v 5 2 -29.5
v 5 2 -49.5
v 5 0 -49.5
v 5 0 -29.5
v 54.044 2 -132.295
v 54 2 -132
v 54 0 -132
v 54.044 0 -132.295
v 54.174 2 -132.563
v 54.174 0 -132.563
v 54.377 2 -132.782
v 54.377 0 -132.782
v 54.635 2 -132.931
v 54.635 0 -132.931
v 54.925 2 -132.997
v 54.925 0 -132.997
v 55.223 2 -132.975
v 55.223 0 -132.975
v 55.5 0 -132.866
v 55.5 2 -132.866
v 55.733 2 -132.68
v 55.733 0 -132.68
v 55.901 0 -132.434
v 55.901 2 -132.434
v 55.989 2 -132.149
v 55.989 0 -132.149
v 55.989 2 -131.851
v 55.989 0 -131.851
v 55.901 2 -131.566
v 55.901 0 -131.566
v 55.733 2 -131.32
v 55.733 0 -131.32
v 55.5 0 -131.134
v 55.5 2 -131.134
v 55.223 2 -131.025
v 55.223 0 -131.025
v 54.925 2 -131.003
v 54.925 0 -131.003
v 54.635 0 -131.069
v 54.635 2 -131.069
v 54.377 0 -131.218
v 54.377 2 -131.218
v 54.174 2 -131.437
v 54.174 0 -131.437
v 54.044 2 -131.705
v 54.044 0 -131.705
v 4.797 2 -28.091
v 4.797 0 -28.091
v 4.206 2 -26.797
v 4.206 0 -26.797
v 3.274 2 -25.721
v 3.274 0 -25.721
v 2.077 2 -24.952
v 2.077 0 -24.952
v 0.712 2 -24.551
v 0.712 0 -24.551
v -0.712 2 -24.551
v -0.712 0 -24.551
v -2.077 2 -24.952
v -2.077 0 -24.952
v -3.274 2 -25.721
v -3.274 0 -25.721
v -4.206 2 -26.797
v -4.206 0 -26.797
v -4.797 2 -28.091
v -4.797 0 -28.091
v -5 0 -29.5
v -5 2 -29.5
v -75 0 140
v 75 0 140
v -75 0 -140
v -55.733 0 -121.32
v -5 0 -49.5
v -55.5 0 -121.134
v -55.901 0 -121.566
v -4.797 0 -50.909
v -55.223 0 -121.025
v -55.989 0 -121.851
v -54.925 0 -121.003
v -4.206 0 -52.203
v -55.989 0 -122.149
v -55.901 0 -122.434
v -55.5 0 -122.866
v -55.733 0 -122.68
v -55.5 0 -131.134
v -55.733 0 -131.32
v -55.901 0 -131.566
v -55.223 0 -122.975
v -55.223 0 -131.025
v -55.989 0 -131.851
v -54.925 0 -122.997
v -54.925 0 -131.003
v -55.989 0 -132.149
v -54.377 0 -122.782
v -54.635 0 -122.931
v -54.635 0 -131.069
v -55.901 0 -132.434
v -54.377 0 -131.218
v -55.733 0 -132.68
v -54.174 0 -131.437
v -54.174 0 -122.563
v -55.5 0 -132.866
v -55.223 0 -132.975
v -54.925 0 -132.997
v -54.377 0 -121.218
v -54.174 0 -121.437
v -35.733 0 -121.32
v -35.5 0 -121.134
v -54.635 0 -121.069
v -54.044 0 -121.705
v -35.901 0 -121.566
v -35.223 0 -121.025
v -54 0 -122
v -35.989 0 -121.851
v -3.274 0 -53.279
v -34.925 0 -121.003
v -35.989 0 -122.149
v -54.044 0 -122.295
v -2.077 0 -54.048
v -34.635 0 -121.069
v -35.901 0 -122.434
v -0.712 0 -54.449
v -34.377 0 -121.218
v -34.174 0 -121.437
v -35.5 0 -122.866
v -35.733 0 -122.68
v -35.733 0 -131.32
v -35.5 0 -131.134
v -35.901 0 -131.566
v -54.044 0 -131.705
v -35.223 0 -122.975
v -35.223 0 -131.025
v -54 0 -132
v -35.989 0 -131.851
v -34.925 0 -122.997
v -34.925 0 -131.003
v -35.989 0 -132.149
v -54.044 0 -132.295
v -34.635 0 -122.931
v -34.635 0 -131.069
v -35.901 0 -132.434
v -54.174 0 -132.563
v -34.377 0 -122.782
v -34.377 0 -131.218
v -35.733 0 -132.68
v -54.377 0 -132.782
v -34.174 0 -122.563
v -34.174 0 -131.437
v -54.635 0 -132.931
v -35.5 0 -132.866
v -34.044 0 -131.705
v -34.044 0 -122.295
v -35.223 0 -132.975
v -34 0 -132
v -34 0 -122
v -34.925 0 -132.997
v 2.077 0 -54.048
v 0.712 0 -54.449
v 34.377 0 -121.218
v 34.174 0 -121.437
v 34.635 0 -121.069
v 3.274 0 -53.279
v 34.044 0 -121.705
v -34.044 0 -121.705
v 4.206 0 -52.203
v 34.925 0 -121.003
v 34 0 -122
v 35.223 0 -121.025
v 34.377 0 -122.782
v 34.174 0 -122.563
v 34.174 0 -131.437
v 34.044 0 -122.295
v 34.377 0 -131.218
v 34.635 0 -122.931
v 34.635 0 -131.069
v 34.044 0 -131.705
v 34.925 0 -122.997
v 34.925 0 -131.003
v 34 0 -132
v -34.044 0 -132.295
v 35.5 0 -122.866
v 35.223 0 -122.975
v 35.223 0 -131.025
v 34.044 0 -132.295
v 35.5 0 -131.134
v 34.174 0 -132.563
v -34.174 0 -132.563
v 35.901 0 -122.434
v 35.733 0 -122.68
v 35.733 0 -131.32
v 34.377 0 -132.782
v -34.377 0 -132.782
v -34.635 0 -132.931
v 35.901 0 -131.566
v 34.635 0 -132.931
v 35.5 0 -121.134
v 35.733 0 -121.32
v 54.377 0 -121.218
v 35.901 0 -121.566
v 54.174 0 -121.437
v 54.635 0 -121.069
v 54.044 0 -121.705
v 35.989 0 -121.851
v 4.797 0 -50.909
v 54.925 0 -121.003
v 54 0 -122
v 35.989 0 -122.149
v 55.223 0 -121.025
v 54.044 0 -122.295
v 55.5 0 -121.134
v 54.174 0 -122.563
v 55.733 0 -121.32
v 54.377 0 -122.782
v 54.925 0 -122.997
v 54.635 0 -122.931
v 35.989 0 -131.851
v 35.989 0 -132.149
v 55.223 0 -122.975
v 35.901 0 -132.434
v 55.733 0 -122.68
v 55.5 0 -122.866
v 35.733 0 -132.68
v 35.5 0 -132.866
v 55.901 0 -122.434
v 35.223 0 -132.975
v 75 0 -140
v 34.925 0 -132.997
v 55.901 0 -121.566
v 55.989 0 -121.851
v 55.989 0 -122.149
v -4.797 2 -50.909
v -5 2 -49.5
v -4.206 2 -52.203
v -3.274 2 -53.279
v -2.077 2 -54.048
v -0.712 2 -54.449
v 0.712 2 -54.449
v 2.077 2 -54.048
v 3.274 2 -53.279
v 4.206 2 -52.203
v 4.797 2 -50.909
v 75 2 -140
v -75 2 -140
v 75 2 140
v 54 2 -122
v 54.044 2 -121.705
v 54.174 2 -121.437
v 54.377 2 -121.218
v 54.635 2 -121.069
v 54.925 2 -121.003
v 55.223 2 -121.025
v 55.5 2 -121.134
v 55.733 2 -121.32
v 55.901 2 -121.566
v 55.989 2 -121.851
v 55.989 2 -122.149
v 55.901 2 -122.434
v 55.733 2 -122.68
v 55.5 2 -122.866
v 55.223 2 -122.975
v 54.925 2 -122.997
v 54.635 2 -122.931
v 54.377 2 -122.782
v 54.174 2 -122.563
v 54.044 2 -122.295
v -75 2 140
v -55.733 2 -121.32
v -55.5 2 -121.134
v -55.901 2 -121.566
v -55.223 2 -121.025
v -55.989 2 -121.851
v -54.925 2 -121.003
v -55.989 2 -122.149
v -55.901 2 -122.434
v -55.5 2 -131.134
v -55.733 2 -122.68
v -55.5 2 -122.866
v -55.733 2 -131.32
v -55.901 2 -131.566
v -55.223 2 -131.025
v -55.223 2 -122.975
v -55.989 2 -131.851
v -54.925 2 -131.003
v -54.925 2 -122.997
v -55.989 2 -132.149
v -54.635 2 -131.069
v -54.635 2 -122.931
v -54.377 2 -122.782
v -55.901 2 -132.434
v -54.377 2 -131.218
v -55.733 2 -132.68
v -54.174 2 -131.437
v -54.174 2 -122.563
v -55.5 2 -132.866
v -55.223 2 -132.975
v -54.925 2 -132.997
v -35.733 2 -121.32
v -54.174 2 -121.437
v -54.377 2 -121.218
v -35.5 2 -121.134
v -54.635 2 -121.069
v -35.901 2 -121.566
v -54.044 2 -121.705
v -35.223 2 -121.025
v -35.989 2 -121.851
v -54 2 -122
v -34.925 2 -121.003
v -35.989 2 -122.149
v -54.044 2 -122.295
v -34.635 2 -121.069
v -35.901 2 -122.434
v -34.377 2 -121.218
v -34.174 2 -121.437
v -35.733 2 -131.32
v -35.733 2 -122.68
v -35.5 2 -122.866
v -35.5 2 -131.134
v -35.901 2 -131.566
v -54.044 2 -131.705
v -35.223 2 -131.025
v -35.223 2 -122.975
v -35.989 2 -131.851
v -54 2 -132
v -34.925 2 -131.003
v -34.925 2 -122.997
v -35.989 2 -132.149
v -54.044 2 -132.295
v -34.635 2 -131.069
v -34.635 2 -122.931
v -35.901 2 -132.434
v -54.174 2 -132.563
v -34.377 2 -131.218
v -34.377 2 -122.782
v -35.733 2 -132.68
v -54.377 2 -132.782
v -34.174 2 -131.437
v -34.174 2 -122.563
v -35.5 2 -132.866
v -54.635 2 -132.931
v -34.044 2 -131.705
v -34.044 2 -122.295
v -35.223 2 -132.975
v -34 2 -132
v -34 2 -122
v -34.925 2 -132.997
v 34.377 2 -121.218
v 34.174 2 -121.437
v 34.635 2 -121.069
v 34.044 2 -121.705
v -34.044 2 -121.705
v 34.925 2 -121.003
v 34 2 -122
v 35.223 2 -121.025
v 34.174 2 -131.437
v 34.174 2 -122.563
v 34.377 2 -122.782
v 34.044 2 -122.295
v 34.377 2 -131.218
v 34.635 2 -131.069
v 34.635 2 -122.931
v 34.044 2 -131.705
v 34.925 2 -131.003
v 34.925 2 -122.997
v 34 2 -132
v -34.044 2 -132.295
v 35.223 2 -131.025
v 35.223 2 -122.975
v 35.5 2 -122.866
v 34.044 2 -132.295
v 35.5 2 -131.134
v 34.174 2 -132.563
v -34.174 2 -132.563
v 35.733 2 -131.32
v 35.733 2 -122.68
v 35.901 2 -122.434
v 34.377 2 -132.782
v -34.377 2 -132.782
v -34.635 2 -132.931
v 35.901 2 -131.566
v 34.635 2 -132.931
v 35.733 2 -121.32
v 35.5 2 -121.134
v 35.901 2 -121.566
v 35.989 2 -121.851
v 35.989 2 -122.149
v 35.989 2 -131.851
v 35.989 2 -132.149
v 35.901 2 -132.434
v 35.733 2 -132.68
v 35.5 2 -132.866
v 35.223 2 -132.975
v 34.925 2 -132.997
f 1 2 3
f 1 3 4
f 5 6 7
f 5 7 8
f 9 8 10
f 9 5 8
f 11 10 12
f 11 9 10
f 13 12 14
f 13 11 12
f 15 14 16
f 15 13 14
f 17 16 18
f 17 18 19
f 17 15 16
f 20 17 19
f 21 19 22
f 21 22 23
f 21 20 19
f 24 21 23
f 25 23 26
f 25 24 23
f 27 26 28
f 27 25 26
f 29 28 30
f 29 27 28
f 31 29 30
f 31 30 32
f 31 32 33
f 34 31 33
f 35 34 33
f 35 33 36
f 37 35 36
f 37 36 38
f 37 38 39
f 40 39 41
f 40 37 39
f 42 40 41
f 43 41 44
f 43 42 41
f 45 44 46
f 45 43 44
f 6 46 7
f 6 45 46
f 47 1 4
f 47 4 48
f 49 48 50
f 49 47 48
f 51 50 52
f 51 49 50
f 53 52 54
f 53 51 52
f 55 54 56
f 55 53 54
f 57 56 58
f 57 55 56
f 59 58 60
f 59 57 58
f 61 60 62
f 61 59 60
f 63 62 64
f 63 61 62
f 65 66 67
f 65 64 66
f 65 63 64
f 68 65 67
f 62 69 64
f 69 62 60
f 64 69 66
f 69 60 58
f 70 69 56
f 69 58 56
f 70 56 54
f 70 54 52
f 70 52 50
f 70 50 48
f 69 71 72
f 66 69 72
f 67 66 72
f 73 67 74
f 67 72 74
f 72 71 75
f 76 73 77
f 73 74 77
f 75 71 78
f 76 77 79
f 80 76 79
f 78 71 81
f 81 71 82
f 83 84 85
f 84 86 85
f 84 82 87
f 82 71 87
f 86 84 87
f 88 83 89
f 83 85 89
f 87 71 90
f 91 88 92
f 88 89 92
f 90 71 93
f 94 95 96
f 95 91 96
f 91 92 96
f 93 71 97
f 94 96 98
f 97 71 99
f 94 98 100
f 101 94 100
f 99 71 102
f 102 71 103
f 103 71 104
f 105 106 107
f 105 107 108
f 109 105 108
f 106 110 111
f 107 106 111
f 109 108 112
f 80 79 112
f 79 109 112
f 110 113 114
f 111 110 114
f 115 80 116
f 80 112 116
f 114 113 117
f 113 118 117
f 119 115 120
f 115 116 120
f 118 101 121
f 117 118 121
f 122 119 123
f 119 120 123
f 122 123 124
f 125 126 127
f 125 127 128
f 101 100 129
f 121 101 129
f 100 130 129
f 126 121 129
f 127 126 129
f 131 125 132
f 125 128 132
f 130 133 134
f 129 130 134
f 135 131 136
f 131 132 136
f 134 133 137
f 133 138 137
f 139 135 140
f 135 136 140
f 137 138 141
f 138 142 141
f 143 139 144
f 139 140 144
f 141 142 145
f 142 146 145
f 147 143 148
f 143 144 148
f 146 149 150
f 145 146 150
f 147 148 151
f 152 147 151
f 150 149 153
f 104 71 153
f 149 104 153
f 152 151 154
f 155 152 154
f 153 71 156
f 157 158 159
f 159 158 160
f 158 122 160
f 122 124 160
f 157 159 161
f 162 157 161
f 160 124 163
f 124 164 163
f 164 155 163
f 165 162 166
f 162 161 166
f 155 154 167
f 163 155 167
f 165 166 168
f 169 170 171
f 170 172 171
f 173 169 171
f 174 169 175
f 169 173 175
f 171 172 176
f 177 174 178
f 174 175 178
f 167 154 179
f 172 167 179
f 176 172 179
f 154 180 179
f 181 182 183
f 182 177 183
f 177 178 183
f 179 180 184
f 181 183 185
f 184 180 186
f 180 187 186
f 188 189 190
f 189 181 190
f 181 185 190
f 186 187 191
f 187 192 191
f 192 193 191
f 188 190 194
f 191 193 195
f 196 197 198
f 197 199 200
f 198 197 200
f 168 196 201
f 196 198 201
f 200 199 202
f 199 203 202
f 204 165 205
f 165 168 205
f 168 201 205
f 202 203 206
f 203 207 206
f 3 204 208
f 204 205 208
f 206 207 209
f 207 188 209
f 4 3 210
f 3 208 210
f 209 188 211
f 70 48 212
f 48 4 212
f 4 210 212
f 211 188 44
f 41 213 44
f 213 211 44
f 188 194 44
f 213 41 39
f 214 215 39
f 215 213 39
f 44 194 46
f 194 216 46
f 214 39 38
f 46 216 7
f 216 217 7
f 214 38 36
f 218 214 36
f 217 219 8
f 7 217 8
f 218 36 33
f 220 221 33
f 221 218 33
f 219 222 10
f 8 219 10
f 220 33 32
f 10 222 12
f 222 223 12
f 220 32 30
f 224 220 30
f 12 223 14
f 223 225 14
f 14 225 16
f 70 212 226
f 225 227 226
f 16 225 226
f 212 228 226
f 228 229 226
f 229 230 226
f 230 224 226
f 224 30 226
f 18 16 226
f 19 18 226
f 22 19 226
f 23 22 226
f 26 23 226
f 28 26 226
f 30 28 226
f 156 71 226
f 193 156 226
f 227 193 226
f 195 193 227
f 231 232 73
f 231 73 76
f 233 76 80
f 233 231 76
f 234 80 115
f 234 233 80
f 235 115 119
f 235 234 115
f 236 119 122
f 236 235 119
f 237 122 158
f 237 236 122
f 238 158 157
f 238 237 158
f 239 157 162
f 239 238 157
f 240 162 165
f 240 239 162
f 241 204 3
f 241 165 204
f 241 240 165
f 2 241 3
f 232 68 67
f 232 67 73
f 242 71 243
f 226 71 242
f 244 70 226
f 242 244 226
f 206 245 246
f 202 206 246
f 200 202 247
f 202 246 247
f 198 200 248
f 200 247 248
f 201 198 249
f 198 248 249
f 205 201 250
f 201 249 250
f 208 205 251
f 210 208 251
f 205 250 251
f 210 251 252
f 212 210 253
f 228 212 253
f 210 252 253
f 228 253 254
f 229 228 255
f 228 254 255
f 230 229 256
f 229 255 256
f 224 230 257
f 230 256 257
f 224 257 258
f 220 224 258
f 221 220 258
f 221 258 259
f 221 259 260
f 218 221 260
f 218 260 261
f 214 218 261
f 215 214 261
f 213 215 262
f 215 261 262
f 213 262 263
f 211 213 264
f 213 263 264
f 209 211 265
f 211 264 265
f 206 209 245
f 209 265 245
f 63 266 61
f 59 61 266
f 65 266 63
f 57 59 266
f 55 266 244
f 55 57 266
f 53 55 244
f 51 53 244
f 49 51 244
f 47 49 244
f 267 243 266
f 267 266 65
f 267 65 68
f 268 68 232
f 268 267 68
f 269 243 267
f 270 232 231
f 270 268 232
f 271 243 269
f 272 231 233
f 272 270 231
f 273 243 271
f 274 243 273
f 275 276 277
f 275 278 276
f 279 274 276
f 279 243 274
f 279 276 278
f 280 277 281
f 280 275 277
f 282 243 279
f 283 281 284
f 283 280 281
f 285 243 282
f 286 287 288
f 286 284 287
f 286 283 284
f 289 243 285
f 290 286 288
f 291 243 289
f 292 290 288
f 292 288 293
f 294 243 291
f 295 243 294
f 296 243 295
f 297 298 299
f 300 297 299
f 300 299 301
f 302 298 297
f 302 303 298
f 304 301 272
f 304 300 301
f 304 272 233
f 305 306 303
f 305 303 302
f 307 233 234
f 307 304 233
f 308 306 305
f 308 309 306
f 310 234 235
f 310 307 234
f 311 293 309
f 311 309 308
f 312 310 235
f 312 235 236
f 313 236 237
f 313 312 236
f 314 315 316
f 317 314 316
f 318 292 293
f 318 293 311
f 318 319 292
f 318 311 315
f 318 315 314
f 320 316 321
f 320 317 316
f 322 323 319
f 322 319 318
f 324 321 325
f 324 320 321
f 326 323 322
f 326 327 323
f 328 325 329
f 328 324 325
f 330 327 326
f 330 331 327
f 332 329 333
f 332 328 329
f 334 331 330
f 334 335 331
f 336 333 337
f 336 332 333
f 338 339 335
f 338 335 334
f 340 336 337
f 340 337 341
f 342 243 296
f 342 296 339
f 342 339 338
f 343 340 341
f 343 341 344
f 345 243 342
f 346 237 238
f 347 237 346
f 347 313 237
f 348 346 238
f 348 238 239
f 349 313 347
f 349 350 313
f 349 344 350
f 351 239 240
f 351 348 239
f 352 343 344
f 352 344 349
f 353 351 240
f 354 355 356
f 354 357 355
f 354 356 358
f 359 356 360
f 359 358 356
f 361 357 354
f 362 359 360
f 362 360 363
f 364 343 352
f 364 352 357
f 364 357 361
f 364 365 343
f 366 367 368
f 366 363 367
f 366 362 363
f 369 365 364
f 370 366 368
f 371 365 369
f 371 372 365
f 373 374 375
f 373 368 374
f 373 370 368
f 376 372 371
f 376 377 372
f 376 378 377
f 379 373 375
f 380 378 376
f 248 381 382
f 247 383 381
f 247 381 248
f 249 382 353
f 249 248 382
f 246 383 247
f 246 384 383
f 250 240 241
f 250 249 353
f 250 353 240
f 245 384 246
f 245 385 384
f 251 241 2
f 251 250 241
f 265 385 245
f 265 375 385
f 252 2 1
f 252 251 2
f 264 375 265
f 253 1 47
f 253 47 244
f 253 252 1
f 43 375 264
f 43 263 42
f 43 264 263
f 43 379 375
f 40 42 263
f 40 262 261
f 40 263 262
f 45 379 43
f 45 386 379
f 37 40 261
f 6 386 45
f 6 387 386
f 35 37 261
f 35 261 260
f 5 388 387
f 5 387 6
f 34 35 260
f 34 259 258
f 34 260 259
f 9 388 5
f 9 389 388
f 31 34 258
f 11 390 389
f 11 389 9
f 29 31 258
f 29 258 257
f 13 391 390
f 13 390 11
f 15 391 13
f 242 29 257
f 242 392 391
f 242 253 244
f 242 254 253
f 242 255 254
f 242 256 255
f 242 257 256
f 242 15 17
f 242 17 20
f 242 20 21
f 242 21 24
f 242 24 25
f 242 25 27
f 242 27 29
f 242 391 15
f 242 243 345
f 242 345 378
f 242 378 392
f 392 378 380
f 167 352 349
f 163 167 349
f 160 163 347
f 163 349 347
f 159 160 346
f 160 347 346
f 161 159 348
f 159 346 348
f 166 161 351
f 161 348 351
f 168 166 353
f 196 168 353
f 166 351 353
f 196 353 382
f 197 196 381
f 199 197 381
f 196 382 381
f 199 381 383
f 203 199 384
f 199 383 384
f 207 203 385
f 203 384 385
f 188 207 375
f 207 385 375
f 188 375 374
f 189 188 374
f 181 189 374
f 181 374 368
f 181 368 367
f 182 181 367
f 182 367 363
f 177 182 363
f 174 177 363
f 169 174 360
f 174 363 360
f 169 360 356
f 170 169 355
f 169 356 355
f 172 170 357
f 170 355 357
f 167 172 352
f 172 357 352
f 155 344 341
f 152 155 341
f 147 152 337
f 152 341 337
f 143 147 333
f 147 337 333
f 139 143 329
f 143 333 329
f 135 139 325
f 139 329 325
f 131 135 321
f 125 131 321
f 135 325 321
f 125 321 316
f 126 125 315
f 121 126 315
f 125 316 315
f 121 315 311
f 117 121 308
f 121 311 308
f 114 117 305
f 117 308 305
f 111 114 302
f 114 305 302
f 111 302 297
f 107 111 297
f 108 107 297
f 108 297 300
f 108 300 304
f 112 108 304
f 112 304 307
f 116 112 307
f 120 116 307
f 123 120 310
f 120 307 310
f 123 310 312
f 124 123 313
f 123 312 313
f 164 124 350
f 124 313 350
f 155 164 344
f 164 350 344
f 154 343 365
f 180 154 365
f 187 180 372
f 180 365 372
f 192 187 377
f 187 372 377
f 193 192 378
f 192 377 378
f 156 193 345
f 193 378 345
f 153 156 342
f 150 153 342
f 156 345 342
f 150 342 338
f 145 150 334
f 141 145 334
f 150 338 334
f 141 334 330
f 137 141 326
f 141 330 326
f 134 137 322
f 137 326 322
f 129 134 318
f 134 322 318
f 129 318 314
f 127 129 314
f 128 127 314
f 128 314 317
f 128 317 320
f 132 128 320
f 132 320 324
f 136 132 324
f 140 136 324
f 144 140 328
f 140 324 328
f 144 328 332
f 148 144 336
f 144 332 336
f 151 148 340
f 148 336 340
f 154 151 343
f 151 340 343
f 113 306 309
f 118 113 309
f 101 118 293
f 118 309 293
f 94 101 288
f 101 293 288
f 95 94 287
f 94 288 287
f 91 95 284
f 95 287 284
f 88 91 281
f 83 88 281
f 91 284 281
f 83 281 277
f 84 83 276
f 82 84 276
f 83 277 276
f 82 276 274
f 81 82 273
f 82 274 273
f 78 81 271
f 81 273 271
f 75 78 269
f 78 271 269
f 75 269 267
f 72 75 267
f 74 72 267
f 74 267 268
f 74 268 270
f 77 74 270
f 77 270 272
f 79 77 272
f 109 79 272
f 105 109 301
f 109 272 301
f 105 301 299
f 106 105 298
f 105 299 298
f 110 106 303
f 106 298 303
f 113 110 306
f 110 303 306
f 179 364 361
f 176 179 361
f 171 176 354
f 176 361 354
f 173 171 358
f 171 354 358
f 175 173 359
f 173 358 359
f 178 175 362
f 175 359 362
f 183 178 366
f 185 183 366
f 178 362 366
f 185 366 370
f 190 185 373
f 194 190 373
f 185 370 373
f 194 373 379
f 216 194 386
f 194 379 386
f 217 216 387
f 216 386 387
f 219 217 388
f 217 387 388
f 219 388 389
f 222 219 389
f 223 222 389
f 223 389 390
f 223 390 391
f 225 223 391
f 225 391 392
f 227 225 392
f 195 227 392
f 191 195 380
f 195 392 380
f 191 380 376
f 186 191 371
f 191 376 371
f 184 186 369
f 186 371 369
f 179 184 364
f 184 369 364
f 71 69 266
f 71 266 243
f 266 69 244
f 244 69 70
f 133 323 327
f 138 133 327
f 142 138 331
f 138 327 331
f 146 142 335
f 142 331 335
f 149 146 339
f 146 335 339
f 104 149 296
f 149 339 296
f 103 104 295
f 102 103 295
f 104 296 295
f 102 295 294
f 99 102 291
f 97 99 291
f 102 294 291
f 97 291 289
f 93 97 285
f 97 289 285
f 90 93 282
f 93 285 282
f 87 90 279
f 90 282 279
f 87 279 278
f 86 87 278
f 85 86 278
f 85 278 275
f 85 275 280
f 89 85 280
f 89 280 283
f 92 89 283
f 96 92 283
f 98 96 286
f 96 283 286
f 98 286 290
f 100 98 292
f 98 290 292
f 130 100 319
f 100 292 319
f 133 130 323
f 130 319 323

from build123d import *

# Parameters (mm, degrees)
SKETCH_1_W                  = 150
SKETCH_1_H                  = 280
EXTRUDE_1_DEPTH             = 2
SKETCH_4_R                  = 1
CUT_EXTRUDE_1_DEPTH         = 2
PATTERN_LINEAR_1_COUNT      = 2
PATTERN_LINEAR_1_PITCH      = 20
PATTERN_LINEAR_1_COUNT_DIR2 = 2
PATTERN_LINEAR_1_PITCH_DIR2 = 10
MIRROR_2_COPY_1_SKETCH_R    = 1
MIRROR_2_COPY_1_DEPTH       = 2
MIRROR_2_COPY_2_SKETCH_R    = 1
MIRROR_2_COPY_2_DEPTH       = 2
MIRROR_2_COPY_3_SKETCH_R    = 1
MIRROR_2_COPY_3_DEPTH       = 2
CUT_EXTRUDE_2_DEPTH         = 10


with BuildPart() as part:
    # 草图1 → 凸台-拉伸1 (new body)
    with BuildSketch(Plane(origin=(0, 0, 0), x_dir=(1, 0, 0), z_dir=(0, 1, 0))):
        Rectangle(SKETCH_1_W, SKETCH_1_H)
    extrude(amount=EXTRUDE_1_DEPTH)

    # 草图4 → 切除-拉伸1 (cut)
    with BuildSketch(Plane(origin=(0, 2, 0), x_dir=(1, 0, 0), z_dir=(0, 1, 0))):
        with Locations((-55, 132)):
            Circle(SKETCH_4_R)
    cut_extrude_1 = extrude(amount=-CUT_EXTRUDE_1_DEPTH, mode=Mode.SUBTRACT)

    # 阵列(线性)1: Cut-Extrude 1 2 × 2
    with Locations(*[(i * PATTERN_LINEAR_1_PITCH, 0, j * PATTERN_LINEAR_1_PITCH_DIR2) for i in range(PATTERN_LINEAR_1_COUNT) for j in range(PATTERN_LINEAR_1_COUNT_DIR2) if (i, j) != (0, 0)]):
        add(cut_extrude_1, mode=Mode.SUBTRACT)

    # 镜向2: 切除-拉伸1 across plane
    add(cut_extrude_1.mirror(Plane.ZY), mode=Mode.SUBTRACT)

    # 镜向2 copy 1 sketch → 镜向2 copy 1 (cut)
    with BuildSketch(Plane(origin=(0, 2, 10), x_dir=(-1, 0, 0), z_dir=(0, 1, 0))):
        with Locations((-55, -132)):
            Circle(MIRROR_2_COPY_1_SKETCH_R)
    extrude(amount=-MIRROR_2_COPY_1_DEPTH, mode=Mode.SUBTRACT)

    # 镜向2 copy 2 sketch → 镜向2 copy 2 (cut)
    with BuildSketch(Plane(origin=(-20, 2, 0), x_dir=(-1, 0, 0), z_dir=(0, 1, 0))):
        with Locations((-55, -132)):
            Circle(MIRROR_2_COPY_2_SKETCH_R)
    extrude(amount=-MIRROR_2_COPY_2_DEPTH, mode=Mode.SUBTRACT)

    # 镜向2 copy 3 sketch → 镜向2 copy 3 (cut)
    with BuildSketch(Plane(origin=(-20, 2, 10), x_dir=(-1, 0, 0), z_dir=(0, 1, 0))):
        with Locations((-55, -132)):
            Circle(MIRROR_2_COPY_3_SKETCH_R)
    extrude(amount=-MIRROR_2_COPY_3_DEPTH, mode=Mode.SUBTRACT)

    # 草图5 → 切除-拉伸2 (cut)
    with BuildSketch(Plane(origin=(0, 2, 0), x_dir=(1, 0, 0), z_dir=(0, 1, 0))):
        with BuildLine():
            Line((5, 49.5), (5, 29.5))
            ThreePointArc((5, 29.5), (0, 24.5), (-5, 29.5))
            Line((-5, 29.5), (-5, 49.5))
            ThreePointArc((-5, 49.5), (0, 54.5), (5, 49.5))
        make_face()
    extrude(amount=-CUT_EXTRUDE_2_DEPTH, mode=Mode.SUBTRACT)


solid = part.part
